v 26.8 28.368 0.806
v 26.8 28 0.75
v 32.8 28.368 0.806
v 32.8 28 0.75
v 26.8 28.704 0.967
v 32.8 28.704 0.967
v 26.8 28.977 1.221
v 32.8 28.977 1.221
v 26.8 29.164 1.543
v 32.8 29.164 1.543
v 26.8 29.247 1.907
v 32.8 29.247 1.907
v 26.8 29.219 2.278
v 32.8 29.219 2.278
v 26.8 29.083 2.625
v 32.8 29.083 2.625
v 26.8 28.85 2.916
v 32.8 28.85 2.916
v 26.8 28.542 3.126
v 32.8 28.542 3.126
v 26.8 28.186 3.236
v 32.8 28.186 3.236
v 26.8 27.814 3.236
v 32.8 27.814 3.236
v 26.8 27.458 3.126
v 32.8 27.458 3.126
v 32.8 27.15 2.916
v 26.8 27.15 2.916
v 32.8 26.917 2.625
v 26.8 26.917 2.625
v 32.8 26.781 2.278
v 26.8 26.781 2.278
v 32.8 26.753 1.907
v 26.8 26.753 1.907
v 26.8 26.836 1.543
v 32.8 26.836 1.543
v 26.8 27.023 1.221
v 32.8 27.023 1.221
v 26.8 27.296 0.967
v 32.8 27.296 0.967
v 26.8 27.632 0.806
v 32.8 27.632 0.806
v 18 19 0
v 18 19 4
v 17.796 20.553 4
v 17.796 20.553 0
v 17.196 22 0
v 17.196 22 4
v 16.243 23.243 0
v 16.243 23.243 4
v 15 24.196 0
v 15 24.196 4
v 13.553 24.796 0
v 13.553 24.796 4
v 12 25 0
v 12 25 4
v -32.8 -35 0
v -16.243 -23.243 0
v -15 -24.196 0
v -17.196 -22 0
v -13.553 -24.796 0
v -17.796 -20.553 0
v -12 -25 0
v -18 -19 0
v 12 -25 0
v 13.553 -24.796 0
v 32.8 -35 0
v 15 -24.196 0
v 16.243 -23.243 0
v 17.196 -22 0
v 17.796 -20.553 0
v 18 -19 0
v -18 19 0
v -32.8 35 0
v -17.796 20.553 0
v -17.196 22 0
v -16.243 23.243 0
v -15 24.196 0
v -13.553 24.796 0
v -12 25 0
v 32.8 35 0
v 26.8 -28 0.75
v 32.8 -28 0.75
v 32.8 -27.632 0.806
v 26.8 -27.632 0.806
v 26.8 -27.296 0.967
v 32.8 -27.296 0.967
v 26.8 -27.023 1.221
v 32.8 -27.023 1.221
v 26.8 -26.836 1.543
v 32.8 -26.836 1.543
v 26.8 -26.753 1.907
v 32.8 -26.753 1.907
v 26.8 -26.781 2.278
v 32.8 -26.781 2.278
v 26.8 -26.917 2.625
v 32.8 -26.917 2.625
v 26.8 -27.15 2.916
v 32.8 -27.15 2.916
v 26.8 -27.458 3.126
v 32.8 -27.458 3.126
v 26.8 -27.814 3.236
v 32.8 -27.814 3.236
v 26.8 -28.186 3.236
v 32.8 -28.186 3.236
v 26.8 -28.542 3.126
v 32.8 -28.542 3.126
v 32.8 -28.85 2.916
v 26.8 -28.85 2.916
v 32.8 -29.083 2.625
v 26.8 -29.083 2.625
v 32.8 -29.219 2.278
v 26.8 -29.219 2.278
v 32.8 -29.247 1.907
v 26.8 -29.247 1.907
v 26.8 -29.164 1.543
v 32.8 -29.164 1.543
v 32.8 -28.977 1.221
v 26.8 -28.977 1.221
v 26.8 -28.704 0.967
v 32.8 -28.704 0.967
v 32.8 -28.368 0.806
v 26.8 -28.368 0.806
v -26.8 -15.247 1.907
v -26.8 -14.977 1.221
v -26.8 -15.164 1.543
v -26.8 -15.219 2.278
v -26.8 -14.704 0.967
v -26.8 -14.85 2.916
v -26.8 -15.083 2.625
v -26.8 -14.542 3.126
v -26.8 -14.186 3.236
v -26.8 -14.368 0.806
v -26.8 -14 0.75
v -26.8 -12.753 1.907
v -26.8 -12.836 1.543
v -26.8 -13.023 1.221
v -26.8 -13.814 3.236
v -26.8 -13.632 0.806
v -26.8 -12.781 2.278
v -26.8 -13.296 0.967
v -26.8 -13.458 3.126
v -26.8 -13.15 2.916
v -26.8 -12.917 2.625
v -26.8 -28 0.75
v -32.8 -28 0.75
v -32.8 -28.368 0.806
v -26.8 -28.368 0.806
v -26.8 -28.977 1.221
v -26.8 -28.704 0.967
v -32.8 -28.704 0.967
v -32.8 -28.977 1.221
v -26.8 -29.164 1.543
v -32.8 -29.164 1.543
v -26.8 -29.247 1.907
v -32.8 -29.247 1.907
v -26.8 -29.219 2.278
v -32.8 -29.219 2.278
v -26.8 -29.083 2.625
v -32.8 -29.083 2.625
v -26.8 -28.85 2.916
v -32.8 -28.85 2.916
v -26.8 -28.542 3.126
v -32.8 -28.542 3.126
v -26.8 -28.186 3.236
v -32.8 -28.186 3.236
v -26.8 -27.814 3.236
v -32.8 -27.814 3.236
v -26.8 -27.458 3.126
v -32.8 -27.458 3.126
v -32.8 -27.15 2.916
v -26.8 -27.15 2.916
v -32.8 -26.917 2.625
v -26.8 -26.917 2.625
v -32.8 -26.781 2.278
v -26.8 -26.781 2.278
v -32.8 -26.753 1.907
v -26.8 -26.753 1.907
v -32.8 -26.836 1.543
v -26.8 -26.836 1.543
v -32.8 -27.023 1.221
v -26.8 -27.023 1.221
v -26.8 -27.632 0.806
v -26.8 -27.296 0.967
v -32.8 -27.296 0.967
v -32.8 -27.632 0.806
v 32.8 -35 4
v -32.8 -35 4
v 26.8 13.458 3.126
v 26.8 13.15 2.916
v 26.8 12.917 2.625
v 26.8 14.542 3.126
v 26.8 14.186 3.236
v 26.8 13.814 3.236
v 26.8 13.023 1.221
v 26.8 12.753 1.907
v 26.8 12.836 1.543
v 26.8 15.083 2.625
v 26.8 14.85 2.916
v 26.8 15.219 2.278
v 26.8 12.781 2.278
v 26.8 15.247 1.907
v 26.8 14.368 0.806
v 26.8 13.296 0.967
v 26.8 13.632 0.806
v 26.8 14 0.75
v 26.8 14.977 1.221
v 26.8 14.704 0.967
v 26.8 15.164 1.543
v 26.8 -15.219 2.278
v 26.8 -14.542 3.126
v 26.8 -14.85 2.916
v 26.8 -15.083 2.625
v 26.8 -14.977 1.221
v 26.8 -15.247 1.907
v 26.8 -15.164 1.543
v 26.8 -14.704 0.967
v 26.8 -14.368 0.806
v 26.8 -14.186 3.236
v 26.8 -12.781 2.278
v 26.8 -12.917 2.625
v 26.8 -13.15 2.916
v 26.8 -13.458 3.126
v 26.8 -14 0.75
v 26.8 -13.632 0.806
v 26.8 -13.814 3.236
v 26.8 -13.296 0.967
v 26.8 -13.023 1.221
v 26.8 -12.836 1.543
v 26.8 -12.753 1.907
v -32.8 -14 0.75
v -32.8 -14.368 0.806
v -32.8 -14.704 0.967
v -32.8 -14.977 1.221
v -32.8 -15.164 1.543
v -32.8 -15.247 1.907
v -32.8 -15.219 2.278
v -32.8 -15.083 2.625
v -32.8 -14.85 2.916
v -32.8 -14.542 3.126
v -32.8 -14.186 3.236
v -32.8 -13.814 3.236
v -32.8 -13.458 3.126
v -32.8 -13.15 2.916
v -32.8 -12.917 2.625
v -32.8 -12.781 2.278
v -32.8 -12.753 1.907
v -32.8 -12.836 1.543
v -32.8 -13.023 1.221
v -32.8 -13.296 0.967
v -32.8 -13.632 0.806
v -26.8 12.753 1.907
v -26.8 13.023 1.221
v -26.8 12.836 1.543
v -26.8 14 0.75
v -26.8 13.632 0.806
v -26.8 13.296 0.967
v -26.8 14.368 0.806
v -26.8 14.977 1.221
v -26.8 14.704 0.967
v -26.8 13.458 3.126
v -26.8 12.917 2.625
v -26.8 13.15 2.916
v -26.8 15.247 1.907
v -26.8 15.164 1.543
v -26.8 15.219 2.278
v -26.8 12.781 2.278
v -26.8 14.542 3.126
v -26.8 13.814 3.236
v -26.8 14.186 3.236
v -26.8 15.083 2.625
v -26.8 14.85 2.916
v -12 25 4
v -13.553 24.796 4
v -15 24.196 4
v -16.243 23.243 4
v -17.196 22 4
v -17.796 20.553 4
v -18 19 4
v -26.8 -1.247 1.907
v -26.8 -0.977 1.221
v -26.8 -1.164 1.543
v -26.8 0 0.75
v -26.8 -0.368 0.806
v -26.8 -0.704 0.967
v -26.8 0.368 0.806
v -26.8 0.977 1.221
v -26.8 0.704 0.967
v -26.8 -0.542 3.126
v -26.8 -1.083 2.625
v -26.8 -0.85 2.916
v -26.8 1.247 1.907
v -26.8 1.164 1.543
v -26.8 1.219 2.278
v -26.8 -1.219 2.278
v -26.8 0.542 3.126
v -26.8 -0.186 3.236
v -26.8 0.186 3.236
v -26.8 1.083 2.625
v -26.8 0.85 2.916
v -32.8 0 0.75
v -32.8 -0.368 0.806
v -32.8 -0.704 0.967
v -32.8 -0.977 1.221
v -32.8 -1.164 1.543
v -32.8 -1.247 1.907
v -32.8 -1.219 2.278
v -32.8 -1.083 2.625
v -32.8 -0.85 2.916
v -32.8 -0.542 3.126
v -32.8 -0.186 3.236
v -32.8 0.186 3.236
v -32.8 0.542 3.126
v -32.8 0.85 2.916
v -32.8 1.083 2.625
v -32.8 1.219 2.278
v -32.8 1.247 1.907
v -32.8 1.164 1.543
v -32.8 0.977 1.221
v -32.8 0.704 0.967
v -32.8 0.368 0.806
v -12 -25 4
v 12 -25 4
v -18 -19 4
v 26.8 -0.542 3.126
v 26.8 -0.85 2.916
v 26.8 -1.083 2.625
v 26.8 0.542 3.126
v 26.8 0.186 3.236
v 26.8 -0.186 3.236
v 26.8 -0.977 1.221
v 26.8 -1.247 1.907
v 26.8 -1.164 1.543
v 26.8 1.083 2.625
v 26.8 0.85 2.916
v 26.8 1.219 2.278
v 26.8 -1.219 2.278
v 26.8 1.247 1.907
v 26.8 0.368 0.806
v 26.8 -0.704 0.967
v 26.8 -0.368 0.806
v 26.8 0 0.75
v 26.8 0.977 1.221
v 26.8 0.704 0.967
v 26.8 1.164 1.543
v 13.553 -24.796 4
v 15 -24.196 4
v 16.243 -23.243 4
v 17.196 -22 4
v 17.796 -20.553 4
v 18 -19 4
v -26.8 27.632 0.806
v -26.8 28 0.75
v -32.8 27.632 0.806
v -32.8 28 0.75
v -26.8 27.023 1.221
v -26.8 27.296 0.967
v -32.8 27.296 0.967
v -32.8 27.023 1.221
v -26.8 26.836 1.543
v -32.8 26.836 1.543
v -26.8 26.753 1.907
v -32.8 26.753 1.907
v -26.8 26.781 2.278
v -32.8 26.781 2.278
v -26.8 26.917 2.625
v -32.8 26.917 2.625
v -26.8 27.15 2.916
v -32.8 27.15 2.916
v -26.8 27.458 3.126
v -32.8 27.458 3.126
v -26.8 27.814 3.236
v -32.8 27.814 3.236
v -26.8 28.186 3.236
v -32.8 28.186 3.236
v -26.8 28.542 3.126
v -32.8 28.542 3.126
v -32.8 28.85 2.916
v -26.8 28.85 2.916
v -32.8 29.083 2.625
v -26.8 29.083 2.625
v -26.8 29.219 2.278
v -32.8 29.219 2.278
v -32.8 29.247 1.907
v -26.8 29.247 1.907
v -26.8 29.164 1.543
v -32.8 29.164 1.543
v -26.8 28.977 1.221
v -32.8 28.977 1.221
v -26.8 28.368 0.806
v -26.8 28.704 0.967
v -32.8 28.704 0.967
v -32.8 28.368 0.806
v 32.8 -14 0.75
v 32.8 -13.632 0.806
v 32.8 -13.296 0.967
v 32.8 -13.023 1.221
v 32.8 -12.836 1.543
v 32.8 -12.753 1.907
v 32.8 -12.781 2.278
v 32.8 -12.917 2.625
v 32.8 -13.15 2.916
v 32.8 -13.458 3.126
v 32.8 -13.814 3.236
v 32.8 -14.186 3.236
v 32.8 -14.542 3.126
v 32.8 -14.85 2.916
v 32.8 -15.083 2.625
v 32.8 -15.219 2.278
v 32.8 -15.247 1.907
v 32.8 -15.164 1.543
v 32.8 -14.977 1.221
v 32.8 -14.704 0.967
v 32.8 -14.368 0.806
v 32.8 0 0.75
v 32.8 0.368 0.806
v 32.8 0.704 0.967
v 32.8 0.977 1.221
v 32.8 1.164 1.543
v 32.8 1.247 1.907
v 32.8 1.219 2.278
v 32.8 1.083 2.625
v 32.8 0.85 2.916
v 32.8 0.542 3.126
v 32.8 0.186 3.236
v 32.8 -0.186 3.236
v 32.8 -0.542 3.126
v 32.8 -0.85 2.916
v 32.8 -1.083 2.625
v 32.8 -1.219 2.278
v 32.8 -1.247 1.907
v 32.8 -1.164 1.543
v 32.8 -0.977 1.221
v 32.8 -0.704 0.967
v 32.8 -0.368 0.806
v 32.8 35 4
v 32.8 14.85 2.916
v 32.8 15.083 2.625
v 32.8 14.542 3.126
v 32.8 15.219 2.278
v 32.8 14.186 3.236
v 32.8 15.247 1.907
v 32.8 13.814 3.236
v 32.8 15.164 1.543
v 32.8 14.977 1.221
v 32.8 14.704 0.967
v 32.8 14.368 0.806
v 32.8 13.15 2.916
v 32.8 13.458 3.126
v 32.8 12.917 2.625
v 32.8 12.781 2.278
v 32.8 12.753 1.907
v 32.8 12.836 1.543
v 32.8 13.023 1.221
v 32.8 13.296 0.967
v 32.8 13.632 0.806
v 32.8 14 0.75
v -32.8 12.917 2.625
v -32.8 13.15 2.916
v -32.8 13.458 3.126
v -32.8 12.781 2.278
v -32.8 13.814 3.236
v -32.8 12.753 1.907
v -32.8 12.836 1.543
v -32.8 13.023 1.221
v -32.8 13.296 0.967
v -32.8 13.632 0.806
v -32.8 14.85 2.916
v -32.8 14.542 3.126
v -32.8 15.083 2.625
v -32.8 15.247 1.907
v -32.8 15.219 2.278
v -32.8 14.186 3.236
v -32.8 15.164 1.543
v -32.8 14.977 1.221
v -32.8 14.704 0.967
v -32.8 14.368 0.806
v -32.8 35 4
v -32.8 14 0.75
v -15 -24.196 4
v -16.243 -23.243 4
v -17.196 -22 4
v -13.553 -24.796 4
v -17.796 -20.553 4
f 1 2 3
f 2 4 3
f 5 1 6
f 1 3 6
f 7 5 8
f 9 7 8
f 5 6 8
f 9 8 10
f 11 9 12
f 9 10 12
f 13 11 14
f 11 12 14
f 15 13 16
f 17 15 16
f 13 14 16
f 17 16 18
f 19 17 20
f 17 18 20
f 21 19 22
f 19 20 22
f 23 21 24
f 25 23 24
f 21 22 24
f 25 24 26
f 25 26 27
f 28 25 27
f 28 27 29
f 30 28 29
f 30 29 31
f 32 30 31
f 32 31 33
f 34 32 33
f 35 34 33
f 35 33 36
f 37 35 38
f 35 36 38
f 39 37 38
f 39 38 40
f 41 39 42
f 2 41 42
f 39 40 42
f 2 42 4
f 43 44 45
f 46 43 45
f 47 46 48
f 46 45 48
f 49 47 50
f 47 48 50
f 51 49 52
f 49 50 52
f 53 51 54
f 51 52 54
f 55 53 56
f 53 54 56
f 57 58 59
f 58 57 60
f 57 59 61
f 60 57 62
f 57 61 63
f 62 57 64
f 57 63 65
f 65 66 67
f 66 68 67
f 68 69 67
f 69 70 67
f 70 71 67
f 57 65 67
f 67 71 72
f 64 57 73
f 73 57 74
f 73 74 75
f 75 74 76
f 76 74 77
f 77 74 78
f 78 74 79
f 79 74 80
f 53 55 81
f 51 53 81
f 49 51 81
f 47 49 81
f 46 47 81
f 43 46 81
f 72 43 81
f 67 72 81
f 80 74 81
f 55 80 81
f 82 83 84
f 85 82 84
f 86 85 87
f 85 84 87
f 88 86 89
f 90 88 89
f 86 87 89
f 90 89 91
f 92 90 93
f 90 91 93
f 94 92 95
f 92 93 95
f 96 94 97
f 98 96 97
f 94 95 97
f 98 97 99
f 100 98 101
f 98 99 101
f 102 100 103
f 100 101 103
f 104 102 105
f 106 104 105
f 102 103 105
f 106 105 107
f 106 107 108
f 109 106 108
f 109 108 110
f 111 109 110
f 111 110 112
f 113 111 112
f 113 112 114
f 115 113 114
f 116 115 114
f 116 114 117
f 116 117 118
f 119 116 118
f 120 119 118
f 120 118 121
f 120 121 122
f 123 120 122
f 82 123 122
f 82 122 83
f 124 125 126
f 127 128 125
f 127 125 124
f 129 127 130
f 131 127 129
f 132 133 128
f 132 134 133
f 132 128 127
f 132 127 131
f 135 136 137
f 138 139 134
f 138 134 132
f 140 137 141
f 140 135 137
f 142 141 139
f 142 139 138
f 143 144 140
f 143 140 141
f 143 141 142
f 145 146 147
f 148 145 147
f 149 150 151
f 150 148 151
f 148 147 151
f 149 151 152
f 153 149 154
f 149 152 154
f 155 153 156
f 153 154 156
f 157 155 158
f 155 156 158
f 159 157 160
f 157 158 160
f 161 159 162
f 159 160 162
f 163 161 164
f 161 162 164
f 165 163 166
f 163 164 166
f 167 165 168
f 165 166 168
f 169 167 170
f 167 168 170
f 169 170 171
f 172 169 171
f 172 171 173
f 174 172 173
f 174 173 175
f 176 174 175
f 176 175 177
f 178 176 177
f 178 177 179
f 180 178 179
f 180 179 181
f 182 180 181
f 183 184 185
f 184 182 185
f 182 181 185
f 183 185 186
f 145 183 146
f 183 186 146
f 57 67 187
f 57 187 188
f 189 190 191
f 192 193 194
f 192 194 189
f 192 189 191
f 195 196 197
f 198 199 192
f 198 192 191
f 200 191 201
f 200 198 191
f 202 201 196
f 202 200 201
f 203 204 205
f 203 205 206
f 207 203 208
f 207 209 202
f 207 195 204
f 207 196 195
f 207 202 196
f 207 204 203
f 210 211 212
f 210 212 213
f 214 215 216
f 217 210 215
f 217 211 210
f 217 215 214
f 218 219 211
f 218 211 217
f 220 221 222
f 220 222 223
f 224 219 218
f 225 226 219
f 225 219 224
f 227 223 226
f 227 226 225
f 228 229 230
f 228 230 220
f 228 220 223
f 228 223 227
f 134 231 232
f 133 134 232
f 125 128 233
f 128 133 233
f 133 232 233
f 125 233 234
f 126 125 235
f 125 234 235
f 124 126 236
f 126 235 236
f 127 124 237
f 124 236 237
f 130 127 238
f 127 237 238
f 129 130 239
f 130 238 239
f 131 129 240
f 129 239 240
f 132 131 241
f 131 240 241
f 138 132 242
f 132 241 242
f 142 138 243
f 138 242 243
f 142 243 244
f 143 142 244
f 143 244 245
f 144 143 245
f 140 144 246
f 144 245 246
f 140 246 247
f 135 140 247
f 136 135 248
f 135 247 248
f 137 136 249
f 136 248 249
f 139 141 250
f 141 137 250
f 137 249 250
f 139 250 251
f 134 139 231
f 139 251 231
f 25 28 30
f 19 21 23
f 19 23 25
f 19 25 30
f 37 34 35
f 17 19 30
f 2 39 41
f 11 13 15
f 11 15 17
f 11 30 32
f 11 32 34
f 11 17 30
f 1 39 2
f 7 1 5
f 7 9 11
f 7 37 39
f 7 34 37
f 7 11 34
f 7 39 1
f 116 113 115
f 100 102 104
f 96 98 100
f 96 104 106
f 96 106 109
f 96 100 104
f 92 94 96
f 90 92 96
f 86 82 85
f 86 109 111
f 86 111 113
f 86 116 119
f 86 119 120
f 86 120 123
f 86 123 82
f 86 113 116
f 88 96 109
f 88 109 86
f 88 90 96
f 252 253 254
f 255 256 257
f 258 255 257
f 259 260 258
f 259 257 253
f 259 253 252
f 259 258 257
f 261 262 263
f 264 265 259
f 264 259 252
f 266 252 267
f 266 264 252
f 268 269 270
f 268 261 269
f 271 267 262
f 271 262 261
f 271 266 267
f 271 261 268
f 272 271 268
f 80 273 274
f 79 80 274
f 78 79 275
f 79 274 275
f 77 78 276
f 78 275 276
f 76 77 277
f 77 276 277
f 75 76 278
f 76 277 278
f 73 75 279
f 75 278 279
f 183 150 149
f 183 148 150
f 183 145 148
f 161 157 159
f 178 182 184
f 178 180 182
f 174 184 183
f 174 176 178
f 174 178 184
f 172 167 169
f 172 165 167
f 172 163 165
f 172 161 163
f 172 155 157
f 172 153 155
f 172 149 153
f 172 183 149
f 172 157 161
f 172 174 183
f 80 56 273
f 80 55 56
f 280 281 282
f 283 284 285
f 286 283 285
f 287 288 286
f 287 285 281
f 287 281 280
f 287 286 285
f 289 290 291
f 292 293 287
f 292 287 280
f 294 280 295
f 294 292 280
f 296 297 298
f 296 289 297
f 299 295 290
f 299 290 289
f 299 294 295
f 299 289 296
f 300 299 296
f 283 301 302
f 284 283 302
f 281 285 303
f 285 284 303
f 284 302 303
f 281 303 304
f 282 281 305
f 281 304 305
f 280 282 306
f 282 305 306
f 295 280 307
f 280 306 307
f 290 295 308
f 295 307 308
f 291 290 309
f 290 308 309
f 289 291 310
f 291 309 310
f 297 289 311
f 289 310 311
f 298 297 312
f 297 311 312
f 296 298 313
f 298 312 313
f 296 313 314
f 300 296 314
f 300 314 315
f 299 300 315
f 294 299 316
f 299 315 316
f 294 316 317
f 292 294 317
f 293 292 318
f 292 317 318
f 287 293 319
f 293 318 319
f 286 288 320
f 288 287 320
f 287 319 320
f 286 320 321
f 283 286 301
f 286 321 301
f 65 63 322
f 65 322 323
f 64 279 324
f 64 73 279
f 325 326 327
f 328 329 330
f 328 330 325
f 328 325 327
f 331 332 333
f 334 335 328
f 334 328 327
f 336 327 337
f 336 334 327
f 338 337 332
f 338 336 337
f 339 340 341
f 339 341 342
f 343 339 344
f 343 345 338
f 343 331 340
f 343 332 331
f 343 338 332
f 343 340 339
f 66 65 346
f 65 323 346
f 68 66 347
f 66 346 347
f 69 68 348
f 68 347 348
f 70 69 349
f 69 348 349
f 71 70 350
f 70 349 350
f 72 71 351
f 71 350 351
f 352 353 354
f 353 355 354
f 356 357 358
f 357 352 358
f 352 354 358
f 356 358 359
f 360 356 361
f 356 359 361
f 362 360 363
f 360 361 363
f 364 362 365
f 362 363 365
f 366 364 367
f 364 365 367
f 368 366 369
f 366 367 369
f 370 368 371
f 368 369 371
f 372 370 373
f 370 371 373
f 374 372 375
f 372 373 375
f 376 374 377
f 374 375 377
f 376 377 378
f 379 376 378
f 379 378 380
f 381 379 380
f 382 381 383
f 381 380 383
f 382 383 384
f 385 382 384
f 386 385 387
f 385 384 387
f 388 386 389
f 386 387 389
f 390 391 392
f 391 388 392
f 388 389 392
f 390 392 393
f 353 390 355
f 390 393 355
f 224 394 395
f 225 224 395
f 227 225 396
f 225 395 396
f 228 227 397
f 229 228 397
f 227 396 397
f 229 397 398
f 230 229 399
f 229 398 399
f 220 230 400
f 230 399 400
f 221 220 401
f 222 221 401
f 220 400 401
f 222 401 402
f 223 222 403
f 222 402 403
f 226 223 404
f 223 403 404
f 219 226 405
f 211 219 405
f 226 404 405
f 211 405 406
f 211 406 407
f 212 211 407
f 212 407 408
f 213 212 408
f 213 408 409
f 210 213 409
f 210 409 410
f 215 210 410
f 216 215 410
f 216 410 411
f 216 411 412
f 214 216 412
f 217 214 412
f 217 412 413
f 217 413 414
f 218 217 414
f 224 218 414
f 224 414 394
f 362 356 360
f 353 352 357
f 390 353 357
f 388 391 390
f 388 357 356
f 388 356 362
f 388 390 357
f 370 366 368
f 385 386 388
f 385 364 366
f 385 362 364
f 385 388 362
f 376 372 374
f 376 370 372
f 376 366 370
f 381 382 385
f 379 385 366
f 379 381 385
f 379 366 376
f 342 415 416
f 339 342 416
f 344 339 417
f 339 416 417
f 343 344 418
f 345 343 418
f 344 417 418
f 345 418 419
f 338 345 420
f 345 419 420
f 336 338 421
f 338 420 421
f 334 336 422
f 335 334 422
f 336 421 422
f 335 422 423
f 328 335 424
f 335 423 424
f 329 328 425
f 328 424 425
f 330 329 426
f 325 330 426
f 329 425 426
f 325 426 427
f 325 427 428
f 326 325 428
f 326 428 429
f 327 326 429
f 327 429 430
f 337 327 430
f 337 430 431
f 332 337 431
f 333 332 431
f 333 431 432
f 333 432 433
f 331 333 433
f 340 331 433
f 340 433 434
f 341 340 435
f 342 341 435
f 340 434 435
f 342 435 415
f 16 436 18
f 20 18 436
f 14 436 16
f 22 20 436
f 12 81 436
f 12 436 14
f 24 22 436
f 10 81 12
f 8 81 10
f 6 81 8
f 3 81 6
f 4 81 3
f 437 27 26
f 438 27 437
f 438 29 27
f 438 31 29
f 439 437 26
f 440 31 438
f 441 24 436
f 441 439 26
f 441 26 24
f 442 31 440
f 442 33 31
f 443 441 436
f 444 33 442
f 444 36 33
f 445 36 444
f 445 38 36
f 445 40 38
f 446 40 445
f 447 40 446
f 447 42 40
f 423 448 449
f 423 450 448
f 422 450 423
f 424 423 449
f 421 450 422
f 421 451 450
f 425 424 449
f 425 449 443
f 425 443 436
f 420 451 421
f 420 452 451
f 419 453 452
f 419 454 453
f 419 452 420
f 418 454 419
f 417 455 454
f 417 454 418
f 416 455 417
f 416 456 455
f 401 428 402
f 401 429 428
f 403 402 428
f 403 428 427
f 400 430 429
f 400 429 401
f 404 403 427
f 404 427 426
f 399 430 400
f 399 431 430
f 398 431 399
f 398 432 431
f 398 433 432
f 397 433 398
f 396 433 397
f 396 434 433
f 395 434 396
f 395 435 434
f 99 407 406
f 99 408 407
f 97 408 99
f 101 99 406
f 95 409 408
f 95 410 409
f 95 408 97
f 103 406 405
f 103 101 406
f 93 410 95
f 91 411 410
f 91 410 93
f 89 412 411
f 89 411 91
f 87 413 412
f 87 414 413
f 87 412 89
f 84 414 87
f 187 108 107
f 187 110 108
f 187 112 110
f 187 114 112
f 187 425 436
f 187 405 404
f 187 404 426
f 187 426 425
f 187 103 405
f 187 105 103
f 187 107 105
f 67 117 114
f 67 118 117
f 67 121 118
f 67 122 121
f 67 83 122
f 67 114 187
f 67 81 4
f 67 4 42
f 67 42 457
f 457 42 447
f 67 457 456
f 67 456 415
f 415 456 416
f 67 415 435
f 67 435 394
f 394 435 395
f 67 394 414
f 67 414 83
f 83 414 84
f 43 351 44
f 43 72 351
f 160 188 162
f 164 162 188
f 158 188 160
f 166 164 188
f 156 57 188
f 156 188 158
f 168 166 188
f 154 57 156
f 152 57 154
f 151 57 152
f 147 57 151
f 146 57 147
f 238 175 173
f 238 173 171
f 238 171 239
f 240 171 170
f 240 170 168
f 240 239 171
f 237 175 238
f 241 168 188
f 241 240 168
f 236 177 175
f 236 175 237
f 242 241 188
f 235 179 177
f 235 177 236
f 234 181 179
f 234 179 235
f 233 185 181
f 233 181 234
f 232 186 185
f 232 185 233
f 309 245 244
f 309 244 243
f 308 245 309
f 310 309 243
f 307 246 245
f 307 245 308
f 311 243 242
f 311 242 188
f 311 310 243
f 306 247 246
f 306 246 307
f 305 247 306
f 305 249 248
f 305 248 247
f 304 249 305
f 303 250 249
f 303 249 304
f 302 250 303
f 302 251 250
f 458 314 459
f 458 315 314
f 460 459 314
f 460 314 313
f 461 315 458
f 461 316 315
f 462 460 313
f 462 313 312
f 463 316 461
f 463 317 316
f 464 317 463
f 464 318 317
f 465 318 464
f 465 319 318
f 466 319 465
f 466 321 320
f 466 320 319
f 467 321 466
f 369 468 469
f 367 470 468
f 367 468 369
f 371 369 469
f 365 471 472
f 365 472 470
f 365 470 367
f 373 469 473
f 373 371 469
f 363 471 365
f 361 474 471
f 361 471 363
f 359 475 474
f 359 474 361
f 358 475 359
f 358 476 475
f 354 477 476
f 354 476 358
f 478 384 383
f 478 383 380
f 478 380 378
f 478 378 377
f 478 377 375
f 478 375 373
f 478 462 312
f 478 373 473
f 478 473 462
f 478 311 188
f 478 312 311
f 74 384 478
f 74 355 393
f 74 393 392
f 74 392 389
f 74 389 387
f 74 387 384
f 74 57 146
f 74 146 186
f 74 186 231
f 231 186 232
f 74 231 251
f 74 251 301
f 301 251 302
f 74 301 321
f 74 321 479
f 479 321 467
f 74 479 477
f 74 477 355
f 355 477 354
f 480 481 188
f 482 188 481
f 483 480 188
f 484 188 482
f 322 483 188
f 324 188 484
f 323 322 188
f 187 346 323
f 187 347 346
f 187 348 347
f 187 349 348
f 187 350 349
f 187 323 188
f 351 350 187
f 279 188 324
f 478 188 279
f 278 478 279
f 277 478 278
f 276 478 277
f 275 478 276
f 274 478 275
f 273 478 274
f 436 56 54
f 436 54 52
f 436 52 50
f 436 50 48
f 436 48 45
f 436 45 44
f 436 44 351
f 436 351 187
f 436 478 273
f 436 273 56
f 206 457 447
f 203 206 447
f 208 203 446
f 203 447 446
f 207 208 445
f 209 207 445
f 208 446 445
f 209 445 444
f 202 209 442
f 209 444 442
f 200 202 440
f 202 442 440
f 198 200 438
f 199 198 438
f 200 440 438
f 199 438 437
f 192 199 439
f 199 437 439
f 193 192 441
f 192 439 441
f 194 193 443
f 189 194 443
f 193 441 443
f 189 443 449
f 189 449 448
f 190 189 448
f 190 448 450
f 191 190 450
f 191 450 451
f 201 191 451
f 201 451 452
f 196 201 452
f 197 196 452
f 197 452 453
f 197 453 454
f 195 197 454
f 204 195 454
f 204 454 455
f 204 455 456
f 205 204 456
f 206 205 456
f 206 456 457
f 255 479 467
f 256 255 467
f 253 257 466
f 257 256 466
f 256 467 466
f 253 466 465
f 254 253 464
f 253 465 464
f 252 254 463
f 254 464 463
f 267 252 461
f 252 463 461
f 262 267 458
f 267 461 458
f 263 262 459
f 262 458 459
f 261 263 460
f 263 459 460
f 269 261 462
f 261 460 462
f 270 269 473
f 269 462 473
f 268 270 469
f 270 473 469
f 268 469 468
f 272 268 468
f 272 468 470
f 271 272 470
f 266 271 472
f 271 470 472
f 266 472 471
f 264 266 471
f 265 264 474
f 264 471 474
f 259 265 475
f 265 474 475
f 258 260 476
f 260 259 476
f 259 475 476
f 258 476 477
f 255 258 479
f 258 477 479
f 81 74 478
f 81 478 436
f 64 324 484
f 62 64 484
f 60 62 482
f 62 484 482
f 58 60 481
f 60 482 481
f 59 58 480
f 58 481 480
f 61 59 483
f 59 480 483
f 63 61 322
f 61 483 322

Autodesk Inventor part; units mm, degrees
ref_plane "YZ Plane" through (0, 0, 0) normal (1, 0, 0) x (0, 1, 0)
ref_plane "XZ Plane" through (0, 0, 0) normal (0, 1, 0) x (-1, 0, 0)
ref_plane "XY Plane" through (0, 0, 0) normal (0, 0, 1) x (1, 0, 0)
sketch "스케치1" plane through (0, 0, 0) normal (0, 0, 1) x (1, 0, 0)
  line L0 (-32.8, 35) -> (32.8, 35)
  line L1 (32.8, 35) -> (32.8, -35)
  line L2 (32.8, -35) -> (-32.8, -35)
  line L3 (-32.8, -35) -> (-32.8, 35)
  line L4 (-32.8, 35) -> (32.8, -35) construction
  line L5 (32.8, 35) -> (-32.8, -35) construction
  point P0 (0, 0)
  dimension "d0" = 65.6
  dimension "d1" = 70
extrude "돌출1" add sketch "스케치1" along normal blind 4
sketch "스케치2" plane through (32.8, -35, 0) normal (1, 0, 0) x (0, 0, -1)
  line L0 (0, 0) -> (0, 70) projected
  line L1 (0, 70) -> (-4, 70) projected
  line L2 (-4, 0) -> (-4, 70) projected
  line L3 (0, 0) -> (-4, 0) projected
  line L4 (0, 70) -> (-4, 70) projected
  line L5 (-2, 70) -> (-2, 0) construction
  line L6 (0, 0) -> (-4, 0) projected
  circle A0 centre (-2, 63) radius 1.25
  circle A1 centre (-2, 49) radius 1.25
  circle A2 centre (-2, 35) radius 1.25
  circle A3 centre (-2, 21) radius 1.25
  circle A4 centre (-2, 7) radius 1.25
  point P0 (0, 35)
  dimension "d4" = 2.5
  dimension "d5" = 2.5
  dimension "d6" = 2.5
  dimension "d8" = 2.5
  dimension "d9" = 2.5
  dimension "d10" = 14
  dimension "d11" = 7
  dimension "d12" = 14
  dimension "d13" = 7
  dimension "d14" = 14
extrude "돌출2" cut sketch "스케치2" against normal blind 6 contours A0 | A1 | A2 | A3 | A4
mirror "미러1" about plane through (0, 0, 0) normal (1, 0, 0) of "돌출2"
sketch "스케치3" plane through (0, 0, 0) normal (0, 0, -1) x (-1, 0, 0)
  line L0 (-18, 25) -> (18, 25)
  line L1 (18, 25) -> (18, -25)
  line L2 (18, -25) -> (-18, -25)
  line L3 (-18, -25) -> (-18, 25)
  line L4 (-18, 25) -> (18, -25) construction
  line L5 (18, 25) -> (-18, -25) construction
  point P0 (0, 0)
  dimension "d19" = 36
  dimension "d20" = 50
extrude "돌출3" cut sketch "스케치3" against normal blind 6
fillet "모깎기1" radius 6 4 edges at (18, 25, 2) (-18, 25, 2) (-18, -25, 2) (18, -25, 2)
properties part number "지지프레임2" material "알루미늄 6061"
